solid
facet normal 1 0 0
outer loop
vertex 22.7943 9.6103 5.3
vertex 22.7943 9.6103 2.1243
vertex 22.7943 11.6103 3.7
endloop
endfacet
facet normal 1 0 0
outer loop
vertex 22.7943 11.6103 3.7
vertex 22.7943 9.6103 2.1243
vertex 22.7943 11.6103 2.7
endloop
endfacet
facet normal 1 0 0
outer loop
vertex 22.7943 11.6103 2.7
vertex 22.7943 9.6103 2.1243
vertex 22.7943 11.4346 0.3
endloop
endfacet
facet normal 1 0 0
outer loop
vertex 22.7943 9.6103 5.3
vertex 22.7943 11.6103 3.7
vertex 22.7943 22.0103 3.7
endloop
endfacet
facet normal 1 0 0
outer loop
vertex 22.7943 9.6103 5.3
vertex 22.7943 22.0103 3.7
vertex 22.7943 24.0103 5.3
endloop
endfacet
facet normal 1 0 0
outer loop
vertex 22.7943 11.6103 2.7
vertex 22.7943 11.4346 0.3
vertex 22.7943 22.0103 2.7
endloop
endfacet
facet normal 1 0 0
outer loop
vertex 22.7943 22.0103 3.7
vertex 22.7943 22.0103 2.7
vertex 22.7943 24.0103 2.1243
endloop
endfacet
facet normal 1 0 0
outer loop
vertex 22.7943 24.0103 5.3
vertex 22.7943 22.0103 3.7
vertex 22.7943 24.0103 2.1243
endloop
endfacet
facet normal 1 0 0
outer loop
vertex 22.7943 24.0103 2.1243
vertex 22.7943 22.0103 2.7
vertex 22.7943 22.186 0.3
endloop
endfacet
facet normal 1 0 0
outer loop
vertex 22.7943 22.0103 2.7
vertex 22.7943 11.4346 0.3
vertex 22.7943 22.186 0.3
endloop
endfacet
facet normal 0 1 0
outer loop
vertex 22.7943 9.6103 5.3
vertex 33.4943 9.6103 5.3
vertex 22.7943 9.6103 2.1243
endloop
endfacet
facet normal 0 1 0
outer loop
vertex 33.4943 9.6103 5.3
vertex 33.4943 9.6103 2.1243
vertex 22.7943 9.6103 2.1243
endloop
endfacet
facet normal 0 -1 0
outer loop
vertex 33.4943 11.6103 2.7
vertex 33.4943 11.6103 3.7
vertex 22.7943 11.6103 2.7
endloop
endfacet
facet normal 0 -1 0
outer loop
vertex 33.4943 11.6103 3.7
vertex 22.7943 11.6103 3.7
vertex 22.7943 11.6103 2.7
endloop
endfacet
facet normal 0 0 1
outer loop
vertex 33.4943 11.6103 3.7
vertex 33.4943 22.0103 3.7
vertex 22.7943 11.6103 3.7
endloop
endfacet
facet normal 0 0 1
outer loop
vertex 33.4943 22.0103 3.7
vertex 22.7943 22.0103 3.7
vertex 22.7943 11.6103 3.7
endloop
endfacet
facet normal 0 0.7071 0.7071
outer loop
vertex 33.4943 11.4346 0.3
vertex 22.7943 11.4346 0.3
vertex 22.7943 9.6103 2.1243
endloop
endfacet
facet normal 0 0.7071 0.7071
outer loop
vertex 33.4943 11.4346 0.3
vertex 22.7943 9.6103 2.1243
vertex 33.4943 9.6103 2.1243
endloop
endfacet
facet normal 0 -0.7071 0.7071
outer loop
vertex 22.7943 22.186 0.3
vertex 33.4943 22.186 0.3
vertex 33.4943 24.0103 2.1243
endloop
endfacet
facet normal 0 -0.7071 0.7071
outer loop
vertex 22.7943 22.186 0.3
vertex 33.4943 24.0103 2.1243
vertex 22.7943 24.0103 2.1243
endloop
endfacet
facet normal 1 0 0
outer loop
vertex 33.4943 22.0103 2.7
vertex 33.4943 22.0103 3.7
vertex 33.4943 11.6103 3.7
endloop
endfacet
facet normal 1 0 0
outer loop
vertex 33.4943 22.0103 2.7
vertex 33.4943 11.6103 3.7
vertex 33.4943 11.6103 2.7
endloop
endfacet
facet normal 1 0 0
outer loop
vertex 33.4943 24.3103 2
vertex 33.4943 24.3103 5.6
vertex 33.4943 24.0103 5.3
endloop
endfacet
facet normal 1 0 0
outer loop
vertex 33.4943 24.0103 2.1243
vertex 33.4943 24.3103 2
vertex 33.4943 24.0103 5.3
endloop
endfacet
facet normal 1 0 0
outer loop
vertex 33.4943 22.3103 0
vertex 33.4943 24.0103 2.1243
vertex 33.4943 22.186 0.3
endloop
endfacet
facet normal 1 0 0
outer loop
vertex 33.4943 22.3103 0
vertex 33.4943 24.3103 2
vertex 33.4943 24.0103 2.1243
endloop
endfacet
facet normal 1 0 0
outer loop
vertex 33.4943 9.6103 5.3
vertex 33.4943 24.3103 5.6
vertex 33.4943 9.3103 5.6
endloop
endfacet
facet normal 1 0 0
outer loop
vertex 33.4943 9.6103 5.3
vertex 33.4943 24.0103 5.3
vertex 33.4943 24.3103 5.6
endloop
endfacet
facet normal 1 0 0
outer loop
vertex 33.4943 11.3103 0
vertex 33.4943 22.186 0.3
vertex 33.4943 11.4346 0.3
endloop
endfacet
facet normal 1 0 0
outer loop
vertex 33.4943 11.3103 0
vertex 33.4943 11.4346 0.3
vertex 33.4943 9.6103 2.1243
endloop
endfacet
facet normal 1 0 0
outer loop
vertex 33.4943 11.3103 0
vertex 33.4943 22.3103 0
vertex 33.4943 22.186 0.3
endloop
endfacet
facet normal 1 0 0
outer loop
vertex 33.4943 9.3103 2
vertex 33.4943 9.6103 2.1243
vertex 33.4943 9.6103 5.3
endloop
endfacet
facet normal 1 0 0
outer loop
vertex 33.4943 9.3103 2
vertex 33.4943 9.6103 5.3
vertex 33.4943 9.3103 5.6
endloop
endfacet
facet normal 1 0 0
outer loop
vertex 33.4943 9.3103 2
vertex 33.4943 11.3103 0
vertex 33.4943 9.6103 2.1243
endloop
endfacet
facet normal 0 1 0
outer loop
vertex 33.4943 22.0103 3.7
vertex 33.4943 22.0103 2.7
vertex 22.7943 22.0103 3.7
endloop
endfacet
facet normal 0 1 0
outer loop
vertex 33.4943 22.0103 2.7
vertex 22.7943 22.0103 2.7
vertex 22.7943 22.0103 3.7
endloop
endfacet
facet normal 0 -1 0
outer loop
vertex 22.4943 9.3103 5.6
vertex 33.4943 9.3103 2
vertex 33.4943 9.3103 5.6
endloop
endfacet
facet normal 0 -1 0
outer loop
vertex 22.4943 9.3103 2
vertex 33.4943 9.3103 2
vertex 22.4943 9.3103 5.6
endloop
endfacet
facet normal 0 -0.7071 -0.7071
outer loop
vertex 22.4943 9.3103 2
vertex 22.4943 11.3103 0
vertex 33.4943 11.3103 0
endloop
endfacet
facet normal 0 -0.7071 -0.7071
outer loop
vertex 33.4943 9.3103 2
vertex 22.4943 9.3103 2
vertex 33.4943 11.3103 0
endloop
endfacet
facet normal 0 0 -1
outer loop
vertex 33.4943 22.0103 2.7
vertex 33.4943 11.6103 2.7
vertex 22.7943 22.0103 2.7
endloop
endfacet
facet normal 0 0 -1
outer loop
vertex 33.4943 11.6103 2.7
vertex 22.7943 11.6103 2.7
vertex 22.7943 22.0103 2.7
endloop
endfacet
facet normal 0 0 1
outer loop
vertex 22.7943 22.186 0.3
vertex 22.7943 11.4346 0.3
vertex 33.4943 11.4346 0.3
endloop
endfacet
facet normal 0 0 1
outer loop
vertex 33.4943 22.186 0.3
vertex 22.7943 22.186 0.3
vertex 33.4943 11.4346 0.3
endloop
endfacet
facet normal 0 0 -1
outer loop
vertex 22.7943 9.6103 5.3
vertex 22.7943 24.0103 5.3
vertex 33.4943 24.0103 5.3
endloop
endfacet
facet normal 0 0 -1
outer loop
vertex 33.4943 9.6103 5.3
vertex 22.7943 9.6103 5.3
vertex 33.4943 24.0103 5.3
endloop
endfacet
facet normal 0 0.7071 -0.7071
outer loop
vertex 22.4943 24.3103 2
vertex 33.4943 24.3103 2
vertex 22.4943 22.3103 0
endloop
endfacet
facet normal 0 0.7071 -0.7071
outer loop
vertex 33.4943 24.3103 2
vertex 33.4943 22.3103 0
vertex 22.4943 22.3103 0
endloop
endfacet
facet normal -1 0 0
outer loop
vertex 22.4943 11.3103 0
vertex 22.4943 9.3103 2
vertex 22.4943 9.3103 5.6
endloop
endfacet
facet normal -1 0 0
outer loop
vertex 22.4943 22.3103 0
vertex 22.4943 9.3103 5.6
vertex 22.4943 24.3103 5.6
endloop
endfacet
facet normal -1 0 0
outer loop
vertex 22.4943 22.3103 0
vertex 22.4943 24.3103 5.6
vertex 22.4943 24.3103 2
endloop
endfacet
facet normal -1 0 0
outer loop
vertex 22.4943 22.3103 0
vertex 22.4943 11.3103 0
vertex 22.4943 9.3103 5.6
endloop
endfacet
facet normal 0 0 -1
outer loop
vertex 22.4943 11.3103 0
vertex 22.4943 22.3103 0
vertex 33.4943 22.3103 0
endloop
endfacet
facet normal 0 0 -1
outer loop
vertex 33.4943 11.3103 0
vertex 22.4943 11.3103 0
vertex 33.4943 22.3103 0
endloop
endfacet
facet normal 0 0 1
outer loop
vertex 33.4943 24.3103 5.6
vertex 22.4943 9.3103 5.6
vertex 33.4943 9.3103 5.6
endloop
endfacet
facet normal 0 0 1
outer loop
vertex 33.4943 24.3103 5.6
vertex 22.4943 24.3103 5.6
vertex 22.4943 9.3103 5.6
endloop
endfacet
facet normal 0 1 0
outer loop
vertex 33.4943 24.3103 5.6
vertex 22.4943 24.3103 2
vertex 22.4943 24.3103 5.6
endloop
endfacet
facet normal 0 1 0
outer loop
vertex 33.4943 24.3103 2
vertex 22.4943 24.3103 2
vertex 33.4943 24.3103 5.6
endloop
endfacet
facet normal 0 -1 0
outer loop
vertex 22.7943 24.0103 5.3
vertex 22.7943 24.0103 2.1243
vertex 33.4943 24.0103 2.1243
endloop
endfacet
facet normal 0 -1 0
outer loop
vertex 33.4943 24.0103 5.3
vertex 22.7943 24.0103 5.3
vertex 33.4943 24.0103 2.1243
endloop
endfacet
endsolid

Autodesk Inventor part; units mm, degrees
ref_plane "YZ Plane" through (0, 0, 0) normal (1, 0, 0) x (0, 1, 0)
ref_plane "XZ Plane" through (0, 0, 0) normal (0, 1, 0) x (-1, 0, 0)
ref_plane "XY Plane" through (0, 0, 0) normal (0, 0, 1) x (1, 0, 0)
ref_plane "Work Plane2" through (0, 0, 0) normal (0, 0, 1) x (1, 0, 0)
sketch "Sketch1" plane through (0, 0, 0) normal (0, 0, 1) x (1, 0, 0)
  line L0 (22.4943, 24.3103) -> (33.4943, 24.3103)
  line L1 (33.4943, 24.3103) -> (33.4943, 9.3103)
  line L2 (33.4943, 9.3103) -> (22.4943, 9.3103)
  line L3 (22.4943, 9.3103) -> (22.4943, 24.3103)
  point P0 (0, 0)
  dimension "d0" = 11
  dimension "d2" = 15
extrude "Extrusion1" add sketch "Sketch1" along normal blind 5.6
chamfer "Chamfer1" distance 2 angle 45 2 edges at (27.9943, 9.3103, 0) (27.9943, 24.3103, 0)
shell "Shell1" thickness 0.3 removed faces 1 at (33.4943, 18.6436, 3.7333)
sketch "Sketch2" plane through (22.7943, 9.6103, 5.3) normal (1, 0, 0) x (0, 0, -1)
  line L0 (3.1757, 14.4) -> (0, 14.4) projected
  line L1 (0, 14.4) -> (0, 0) projected
  line L2 (3.1757, 0) -> (0, 0) projected
  line L3 (2.6, 12.4) -> (1.6, 12.4)
  line L4 (1.6, 12.4) -> (1.6, 2)
  line L5 (1.6, 2) -> (2.6, 2)
  line L6 (2.6, 2) -> (2.6, 12.4)
  point P0 (5.3, -9.6103)
  dimension "d9" = 1
  dimension "d12" = 2
  dimension "d13" = 2
  dimension "d14" = 1.6
extrude "Extrusion2" add sketch "Sketch2" along normal up to surface (10.7 mm away)
properties part number "nanopc_t4_hdmi"
